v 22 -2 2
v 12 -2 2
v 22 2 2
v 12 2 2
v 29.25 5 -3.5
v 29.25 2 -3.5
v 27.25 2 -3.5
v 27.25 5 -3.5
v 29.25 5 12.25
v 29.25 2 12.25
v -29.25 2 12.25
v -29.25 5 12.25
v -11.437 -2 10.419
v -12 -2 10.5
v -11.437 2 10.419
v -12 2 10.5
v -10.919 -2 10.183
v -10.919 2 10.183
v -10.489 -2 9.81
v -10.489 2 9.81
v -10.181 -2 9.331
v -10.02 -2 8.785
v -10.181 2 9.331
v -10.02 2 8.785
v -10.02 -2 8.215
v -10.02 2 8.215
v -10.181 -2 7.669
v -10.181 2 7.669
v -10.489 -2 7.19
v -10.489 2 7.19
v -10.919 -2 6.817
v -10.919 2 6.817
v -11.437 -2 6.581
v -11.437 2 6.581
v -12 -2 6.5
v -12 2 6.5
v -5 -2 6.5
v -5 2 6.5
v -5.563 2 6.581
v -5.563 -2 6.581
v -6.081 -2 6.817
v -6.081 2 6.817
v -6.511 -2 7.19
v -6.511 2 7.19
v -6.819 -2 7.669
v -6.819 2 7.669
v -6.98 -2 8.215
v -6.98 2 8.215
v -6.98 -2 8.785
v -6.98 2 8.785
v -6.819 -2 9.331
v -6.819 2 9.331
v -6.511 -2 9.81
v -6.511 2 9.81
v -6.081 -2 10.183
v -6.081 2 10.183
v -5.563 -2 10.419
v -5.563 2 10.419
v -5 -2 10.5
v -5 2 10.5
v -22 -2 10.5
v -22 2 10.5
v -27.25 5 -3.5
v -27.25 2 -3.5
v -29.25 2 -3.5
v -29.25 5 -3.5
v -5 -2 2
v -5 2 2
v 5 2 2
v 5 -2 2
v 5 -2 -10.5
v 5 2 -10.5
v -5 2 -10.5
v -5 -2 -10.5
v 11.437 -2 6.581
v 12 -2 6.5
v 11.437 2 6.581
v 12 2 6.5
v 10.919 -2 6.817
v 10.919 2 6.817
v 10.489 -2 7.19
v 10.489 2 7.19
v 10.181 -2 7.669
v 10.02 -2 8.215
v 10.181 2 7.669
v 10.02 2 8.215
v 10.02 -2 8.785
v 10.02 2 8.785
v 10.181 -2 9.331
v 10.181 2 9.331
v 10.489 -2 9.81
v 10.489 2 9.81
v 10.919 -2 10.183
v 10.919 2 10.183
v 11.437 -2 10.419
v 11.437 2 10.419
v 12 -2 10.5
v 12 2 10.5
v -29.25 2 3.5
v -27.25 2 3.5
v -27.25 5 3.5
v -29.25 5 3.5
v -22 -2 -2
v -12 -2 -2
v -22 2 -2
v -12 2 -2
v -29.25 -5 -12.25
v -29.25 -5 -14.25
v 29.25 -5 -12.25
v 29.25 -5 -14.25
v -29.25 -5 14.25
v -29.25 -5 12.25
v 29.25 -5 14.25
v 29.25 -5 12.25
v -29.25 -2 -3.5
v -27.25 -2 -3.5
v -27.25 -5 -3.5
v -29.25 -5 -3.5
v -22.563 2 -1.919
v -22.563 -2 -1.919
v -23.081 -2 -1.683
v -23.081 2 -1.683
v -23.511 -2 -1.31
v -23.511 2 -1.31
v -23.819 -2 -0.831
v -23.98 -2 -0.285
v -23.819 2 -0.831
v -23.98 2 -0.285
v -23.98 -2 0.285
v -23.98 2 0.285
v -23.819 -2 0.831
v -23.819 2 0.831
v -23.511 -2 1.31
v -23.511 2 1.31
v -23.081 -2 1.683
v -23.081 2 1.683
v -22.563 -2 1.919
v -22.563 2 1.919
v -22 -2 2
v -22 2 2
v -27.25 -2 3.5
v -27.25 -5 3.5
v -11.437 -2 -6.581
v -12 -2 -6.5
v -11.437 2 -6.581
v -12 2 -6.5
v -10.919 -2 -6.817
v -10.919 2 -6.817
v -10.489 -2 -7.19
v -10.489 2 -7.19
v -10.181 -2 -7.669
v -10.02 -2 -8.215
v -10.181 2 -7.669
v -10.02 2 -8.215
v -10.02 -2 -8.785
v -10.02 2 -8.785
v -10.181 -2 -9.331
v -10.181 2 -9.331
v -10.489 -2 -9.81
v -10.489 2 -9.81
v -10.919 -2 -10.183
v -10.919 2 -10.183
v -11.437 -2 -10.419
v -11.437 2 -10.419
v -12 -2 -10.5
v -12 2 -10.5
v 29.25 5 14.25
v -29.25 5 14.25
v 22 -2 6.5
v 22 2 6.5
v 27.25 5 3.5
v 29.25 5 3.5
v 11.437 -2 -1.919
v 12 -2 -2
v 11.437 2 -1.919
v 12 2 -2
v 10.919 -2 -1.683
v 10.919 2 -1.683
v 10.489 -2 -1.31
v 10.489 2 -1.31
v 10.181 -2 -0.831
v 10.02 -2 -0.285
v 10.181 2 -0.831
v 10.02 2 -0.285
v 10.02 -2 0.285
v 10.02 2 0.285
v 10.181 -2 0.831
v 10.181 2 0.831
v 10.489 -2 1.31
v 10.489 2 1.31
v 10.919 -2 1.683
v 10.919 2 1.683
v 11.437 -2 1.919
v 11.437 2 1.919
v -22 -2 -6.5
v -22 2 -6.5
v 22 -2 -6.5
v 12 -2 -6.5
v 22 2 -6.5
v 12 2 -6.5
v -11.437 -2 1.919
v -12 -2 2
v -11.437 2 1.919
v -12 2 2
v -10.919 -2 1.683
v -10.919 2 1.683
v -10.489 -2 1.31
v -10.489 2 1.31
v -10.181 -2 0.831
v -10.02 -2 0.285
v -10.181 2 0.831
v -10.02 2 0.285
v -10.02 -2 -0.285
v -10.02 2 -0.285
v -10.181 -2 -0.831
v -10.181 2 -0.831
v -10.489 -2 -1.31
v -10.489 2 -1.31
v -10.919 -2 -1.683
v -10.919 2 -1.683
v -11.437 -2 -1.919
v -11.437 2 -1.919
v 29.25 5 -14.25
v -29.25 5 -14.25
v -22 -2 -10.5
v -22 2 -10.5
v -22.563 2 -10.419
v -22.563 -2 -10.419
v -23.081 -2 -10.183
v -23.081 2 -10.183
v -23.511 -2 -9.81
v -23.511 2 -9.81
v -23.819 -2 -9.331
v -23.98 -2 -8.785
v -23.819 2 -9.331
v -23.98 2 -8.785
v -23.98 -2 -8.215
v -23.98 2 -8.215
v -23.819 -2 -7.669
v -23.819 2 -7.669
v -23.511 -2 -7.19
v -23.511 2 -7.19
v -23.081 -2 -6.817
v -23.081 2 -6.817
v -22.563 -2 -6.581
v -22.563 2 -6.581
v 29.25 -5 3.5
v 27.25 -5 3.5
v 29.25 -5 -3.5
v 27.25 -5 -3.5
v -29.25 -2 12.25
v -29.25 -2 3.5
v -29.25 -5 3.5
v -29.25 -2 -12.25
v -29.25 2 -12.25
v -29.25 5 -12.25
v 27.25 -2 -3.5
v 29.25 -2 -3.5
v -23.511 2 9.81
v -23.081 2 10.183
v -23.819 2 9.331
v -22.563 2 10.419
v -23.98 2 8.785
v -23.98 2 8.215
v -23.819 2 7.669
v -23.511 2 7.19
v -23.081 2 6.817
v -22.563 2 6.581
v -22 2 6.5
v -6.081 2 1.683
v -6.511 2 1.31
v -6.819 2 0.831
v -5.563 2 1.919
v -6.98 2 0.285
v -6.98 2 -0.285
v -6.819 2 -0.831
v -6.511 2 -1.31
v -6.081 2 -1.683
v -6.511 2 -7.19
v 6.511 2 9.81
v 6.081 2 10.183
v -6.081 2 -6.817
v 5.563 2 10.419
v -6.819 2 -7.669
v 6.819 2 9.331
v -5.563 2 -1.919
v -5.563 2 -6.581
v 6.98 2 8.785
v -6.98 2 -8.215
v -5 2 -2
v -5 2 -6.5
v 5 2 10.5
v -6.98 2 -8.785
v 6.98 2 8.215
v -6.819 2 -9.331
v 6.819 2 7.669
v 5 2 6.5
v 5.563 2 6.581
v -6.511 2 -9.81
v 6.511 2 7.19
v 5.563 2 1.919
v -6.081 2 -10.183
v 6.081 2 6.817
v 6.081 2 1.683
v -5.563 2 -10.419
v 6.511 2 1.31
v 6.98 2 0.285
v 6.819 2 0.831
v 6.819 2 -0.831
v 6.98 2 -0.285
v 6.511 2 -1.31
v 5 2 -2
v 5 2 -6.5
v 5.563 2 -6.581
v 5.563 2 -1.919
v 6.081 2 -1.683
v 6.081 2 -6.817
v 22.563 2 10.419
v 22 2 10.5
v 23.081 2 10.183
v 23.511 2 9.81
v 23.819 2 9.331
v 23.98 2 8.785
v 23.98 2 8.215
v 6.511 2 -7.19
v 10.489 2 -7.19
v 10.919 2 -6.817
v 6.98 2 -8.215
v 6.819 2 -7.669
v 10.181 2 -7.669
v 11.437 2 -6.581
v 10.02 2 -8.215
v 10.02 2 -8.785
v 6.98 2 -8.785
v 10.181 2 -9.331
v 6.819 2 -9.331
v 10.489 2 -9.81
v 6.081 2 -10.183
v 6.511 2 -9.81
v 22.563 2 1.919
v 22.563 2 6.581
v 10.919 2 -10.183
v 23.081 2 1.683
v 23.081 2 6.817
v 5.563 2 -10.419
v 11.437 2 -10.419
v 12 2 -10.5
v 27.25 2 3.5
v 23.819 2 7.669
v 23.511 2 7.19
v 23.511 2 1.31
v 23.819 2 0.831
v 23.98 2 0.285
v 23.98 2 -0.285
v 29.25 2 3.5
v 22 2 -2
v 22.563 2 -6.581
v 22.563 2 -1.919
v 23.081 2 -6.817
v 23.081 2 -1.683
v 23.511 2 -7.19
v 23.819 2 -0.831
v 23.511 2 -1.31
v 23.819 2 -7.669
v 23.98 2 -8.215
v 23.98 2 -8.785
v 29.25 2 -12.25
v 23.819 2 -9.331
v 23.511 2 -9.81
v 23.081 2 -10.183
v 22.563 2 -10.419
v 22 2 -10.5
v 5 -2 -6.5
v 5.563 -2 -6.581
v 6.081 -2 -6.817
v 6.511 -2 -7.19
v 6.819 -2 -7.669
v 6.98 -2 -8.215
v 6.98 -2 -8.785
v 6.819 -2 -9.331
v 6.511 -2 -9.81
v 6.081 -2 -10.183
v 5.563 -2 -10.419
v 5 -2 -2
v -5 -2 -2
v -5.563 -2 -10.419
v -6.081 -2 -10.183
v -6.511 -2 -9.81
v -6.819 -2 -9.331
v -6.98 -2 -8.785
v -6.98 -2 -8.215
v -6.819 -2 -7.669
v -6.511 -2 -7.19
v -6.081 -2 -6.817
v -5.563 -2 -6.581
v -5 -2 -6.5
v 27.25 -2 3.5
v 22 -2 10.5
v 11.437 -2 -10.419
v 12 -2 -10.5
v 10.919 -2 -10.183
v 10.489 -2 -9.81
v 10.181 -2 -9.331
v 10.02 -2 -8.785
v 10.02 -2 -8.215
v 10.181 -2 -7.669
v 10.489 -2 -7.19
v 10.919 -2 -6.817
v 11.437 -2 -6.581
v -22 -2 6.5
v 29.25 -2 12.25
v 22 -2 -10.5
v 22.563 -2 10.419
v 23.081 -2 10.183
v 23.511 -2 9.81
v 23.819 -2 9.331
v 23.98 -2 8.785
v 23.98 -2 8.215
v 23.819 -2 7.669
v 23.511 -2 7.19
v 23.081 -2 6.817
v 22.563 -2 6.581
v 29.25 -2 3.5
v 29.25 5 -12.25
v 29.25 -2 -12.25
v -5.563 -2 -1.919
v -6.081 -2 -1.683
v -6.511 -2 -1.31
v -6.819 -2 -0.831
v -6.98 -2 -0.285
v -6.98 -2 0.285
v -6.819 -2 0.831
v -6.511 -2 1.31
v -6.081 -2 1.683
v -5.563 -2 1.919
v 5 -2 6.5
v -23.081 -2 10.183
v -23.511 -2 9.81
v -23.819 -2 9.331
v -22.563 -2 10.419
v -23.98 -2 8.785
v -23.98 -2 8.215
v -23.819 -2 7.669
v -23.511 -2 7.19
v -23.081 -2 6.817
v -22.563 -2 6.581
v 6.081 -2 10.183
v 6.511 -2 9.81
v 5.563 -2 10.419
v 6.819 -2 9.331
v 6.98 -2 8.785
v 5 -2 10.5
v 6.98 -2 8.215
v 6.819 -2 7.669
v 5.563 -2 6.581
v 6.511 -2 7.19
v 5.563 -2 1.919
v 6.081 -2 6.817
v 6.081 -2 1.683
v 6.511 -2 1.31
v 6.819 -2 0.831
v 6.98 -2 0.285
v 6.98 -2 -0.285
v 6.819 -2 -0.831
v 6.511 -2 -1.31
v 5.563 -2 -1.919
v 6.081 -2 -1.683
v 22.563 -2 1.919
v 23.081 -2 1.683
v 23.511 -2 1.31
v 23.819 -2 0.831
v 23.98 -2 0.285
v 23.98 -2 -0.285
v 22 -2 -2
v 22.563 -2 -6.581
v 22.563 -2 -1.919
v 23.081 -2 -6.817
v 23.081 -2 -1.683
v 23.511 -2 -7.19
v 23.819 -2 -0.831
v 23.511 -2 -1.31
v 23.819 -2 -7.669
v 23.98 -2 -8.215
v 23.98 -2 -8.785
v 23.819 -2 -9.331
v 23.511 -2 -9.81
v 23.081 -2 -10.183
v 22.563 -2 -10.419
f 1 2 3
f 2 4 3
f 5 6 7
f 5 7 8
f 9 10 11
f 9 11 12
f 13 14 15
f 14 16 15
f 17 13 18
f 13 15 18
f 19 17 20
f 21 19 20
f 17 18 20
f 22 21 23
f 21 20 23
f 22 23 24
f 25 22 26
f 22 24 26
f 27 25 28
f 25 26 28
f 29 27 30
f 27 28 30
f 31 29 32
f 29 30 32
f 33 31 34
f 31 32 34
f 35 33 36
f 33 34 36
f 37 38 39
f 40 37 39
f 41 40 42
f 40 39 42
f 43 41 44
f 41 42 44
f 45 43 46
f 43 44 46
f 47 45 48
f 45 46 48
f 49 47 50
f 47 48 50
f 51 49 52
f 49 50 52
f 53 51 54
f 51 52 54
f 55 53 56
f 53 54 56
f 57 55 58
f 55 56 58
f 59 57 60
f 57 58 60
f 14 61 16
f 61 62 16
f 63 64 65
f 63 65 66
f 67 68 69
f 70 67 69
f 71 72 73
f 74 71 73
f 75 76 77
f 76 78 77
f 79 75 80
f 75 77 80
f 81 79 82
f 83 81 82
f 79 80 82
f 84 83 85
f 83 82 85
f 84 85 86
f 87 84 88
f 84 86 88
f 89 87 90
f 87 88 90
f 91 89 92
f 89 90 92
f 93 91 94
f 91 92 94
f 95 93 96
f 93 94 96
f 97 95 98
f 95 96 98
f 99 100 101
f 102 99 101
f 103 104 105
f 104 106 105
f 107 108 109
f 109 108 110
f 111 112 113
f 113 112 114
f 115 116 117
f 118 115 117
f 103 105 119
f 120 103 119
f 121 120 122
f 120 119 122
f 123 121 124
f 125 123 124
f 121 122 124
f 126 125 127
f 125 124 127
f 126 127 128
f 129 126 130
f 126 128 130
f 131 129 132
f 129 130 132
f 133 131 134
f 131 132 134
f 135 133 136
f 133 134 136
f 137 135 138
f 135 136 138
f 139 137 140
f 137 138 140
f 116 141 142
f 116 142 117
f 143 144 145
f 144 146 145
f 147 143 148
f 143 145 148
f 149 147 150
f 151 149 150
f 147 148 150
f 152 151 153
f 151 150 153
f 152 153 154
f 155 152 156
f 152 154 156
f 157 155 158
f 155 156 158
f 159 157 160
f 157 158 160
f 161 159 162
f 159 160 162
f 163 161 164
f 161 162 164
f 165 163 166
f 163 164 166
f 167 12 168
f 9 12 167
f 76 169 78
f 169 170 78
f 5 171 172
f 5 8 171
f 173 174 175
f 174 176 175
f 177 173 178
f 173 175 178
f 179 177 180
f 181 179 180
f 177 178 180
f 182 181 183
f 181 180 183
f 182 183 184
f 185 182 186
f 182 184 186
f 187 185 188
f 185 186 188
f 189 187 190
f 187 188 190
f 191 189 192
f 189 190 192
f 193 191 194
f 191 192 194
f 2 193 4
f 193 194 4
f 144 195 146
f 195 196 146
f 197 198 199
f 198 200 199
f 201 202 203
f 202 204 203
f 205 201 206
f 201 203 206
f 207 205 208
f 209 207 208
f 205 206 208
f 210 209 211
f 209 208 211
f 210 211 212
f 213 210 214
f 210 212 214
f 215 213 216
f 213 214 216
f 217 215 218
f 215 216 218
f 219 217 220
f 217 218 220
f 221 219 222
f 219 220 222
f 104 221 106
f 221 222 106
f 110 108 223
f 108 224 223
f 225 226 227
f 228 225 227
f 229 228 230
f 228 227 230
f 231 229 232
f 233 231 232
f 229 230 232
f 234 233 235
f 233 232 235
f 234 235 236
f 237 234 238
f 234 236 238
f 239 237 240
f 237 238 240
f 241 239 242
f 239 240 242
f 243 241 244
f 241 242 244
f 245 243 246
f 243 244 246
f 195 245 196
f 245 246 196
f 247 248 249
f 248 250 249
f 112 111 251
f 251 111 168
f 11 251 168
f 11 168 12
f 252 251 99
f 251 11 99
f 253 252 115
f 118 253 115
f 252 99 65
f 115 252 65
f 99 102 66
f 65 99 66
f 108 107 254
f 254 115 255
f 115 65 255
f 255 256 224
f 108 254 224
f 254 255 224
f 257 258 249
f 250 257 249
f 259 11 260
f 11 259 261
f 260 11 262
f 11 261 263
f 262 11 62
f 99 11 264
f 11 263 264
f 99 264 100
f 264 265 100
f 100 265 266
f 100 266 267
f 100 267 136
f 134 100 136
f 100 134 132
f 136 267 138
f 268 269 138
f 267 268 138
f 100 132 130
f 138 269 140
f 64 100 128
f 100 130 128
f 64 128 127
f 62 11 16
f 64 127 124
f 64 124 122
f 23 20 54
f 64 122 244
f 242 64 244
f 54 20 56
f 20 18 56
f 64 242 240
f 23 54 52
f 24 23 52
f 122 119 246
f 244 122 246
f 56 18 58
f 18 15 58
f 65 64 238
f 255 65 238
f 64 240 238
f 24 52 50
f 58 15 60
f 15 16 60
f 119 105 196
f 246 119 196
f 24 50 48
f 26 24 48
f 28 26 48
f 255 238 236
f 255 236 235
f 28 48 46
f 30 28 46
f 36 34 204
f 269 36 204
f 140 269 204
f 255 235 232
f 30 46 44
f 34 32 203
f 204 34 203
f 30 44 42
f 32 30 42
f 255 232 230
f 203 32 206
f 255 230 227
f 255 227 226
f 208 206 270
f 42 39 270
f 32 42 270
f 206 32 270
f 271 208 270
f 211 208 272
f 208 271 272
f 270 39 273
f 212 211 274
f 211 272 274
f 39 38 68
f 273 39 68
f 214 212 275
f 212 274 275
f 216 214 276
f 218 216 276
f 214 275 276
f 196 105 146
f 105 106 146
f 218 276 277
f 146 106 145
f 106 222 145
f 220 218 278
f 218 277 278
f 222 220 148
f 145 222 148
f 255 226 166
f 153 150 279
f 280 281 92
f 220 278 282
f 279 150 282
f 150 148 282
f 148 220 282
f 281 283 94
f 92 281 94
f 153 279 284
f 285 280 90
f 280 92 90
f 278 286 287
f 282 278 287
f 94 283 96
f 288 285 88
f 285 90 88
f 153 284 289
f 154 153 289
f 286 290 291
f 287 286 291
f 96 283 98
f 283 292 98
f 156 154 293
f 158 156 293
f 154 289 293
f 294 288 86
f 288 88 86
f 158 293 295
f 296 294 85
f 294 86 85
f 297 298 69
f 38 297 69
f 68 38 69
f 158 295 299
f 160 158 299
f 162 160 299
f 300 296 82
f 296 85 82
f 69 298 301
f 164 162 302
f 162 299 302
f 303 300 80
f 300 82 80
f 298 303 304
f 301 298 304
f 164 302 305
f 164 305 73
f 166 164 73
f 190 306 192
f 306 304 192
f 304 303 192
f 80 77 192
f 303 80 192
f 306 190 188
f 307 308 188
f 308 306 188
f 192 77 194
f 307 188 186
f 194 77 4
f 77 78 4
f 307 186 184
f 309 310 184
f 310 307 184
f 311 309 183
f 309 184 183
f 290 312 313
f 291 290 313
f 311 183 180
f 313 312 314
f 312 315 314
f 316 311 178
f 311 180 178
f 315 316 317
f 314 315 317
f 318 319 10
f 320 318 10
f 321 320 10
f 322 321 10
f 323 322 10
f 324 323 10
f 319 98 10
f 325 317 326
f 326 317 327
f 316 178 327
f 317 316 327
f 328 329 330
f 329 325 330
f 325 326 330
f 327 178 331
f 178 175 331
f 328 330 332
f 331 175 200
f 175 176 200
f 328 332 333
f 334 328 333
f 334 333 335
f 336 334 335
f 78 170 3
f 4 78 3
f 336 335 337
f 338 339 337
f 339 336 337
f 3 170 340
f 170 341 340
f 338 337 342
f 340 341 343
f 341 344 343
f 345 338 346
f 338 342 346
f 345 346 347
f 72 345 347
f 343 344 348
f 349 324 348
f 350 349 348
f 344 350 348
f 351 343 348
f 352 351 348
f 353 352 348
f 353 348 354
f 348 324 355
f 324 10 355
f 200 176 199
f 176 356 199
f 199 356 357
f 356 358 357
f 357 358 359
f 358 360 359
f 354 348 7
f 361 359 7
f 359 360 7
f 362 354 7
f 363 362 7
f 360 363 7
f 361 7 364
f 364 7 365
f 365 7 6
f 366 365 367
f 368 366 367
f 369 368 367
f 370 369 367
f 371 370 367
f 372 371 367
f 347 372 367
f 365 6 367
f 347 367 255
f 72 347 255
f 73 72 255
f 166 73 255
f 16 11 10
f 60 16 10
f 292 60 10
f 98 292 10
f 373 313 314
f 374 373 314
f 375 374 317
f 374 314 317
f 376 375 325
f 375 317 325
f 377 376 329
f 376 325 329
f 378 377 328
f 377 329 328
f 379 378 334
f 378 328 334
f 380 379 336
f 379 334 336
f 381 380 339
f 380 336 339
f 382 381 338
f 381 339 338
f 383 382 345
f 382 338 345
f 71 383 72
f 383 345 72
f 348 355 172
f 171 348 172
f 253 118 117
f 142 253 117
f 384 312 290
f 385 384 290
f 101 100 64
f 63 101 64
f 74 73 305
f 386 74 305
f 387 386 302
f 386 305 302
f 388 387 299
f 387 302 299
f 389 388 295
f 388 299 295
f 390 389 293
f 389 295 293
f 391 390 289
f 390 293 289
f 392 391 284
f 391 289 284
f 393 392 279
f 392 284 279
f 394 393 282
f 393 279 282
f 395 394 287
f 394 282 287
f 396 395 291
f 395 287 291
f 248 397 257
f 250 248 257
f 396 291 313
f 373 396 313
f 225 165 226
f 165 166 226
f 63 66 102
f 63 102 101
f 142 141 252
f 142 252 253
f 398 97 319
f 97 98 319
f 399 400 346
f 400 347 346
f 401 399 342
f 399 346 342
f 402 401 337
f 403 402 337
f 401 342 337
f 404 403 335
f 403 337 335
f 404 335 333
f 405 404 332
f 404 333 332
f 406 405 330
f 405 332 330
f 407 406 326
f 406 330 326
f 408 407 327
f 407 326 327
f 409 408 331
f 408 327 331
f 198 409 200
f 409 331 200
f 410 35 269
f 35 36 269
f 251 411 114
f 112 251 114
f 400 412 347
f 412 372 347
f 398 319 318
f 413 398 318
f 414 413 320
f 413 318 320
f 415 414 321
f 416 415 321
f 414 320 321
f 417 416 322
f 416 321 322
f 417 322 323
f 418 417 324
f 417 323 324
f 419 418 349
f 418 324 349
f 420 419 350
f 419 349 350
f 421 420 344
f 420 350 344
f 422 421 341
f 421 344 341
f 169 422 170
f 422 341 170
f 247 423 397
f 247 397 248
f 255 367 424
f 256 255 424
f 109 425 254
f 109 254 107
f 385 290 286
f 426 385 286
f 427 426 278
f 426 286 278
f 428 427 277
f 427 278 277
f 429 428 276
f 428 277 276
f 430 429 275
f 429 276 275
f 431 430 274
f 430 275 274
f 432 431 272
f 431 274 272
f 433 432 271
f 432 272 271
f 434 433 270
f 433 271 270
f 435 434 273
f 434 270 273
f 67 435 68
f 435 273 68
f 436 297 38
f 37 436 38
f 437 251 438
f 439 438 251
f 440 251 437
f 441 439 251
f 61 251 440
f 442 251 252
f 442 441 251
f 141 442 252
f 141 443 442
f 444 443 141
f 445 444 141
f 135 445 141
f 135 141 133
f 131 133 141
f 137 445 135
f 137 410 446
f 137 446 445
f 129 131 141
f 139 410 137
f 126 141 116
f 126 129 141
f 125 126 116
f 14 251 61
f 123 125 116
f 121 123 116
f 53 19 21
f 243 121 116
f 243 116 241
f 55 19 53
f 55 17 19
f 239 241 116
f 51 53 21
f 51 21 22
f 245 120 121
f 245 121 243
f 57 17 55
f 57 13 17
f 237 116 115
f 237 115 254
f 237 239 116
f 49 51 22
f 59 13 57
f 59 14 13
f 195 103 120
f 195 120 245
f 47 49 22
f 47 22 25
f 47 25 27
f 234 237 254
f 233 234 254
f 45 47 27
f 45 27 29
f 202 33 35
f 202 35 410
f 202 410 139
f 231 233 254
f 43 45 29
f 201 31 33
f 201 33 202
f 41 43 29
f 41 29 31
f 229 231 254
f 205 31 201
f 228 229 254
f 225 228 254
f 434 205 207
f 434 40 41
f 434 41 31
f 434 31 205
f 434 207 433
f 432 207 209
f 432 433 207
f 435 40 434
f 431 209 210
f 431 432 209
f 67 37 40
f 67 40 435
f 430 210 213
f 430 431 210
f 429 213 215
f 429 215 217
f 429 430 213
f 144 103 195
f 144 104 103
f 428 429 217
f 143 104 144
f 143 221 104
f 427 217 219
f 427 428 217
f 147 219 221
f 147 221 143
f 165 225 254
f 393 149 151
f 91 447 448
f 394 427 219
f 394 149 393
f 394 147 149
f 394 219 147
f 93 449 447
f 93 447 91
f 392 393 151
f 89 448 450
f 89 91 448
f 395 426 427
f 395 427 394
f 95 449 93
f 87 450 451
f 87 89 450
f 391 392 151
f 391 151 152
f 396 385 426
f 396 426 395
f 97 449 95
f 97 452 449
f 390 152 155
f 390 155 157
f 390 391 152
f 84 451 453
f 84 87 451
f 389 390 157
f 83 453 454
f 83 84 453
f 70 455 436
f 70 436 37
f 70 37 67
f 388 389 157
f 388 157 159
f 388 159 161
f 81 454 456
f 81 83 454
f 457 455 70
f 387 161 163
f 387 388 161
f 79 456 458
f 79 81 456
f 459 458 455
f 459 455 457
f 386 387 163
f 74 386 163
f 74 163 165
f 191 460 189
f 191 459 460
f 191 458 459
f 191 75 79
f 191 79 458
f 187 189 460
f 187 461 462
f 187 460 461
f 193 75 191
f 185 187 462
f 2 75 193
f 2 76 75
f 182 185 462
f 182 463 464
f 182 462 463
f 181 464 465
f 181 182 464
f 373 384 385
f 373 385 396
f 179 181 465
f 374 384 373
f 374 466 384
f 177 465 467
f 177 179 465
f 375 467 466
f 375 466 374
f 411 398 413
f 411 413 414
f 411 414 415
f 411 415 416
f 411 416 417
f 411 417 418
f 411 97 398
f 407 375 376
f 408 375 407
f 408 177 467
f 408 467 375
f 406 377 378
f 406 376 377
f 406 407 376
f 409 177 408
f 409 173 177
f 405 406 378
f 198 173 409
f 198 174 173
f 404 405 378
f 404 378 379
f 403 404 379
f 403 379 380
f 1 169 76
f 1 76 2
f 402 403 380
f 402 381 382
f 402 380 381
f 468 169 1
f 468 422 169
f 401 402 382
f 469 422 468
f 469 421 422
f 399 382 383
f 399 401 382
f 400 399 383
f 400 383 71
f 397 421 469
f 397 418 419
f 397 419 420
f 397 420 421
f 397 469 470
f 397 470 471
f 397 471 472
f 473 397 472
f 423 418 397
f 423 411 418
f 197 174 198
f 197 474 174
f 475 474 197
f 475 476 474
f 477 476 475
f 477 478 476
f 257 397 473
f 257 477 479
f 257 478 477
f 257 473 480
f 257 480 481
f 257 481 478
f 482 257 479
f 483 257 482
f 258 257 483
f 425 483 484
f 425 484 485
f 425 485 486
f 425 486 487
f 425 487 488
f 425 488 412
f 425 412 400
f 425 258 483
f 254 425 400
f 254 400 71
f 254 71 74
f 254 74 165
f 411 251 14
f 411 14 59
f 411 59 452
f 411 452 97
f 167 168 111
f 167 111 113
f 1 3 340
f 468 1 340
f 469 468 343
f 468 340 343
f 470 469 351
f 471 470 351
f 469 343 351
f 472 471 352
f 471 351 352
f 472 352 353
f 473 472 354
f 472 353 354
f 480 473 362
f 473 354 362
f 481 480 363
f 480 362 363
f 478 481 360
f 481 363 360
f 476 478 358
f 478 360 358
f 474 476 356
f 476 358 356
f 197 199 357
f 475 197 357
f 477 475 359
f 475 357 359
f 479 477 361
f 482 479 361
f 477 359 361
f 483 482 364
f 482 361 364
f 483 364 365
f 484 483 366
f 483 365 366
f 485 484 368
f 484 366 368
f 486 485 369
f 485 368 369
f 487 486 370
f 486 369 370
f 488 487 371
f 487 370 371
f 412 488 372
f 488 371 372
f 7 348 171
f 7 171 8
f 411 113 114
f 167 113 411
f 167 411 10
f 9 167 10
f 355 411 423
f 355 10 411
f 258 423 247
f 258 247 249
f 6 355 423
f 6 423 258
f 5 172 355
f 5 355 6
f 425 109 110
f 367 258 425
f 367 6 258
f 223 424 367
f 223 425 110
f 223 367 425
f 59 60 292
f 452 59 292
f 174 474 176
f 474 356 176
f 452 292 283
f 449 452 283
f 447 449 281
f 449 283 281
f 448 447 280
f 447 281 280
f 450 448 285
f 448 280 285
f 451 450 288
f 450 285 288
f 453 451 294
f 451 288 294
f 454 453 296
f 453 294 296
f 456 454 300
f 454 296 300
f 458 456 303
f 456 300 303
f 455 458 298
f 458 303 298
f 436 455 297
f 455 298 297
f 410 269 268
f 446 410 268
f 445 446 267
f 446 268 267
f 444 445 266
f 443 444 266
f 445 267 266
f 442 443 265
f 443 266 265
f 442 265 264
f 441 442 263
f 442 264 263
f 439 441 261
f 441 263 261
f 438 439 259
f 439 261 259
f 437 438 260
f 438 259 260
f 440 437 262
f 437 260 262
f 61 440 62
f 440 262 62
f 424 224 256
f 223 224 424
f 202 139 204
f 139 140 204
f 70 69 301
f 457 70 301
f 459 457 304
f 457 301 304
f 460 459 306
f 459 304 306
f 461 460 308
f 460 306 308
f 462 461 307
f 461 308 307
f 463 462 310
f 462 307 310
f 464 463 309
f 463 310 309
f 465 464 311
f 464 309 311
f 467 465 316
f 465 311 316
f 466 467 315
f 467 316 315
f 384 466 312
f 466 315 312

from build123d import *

# Parameters (mm, degrees)
SKETCH1_W           = 54.5
SKETCH1_H           = 24.5
BOSS_EXTRUDE1_DEPTH = 2
BOSS_EXTRUDE2_START = -2
SKETCH2_W           = 58.5
SKETCH2_H           = 28.5
SKETCH2_W_2         = 54.5
SKETCH2_H_2         = 24.5
BOSS_EXTRUDE2_DEPTH = 5
CUT_EXTRUDE1_DEPTH  = 33.918459867
FILL_PATTERN1_DEPTH = 2
LPATTERN1_COUNT     = 2
LPATTERN1_PITCH     = 8.5
LPATTERN1_COL_COUNT = 2
LPATTERN1_COL_PITCH = 8.5
SKETCH13_W          = 8.75
SKETCH13_H          = 3
CUT_EXTRUDE2_DEPTH  = 61.417816081


# Read off the part's stored shape, not the designer's step: Fill Pattern1
with BuildPart() as part:
    # Sketch1 → Boss-Extrude1 (new body)
    with BuildSketch(Plane(origin=(0, 0, 0), x_dir=(1, 0, 0), z_dir=(0, 1, 0))):
        Rectangle(SKETCH1_W, SKETCH1_H)
    extrude(amount=BOSS_EXTRUDE1_DEPTH)

    # Sketch2 → Boss-Extrude2 (add)
    with BuildSketch(Plane(origin=(0, 2, 0), x_dir=(1, 0, 0), z_dir=(0, 1, 0)).offset(BOSS_EXTRUDE2_START)):
        Rectangle(SKETCH2_W, SKETCH2_H)
        Rectangle(SKETCH2_W_2, SKETCH2_H_2, mode=Mode.SUBTRACT)
    extrude(amount=BOSS_EXTRUDE2_DEPTH)

    # Sketch5 → Cut-Extrude1 (cut, through all)
    with BuildSketch(Plane.XZ):
        with BuildLine():
            Line((-5, 2), (5, 2))
            ThreePointArc((5, 2), (7, 0), (5, -2))
            Line((5, -2), (-5, -2))
            ThreePointArc((-5, -2), (-7, 0), (-5, 2))
        make_face()
    cut_extrude1 = extrude(amount=-CUT_EXTRUDE1_DEPTH, mode=Mode.SUBTRACT)

    # Fill Pattern1 outline → Fill Pattern1 (cut)
    with BuildSketch(Plane(origin=(0, 0, 0), x_dir=(1, 0, 0), z_dir=(0, 1, 0))):
        with BuildLine():
            ThreePointArc((-22, 2), (-24, 0), (-22, -2))
            Line((-22, -2), (-12, -2))
            ThreePointArc((-12, -2), (-10, 0), (-12, 2))
            Line((-12, 2), (-22, 2))
        make_face()
        with BuildLine():
            ThreePointArc((12, 2), (10, 0), (12, -2))
            Line((12, -2), (22, -2))
            ThreePointArc((22, -2), (24, 0), (22, 2))
            Line((22, 2), (12, 2))
        make_face()
        with BuildLine():
            ThreePointArc((-22, 10.5), (-24, 8.5), (-22, 6.5))
            Line((-22, 6.5), (-12, 6.5))
            ThreePointArc((-12, 6.5), (-10, 8.5), (-12, 10.5))
            Line((-12, 10.5), (-22, 10.5))
        make_face()
        with BuildLine():
            ThreePointArc((12, 10.5), (10, 8.5), (12, 6.5))
            Line((12, 6.5), (22, 6.5))
            ThreePointArc((22, 6.5), (24, 8.5), (22, 10.5))
            Line((22, 10.5), (12, 10.5))
        make_face()
        with BuildLine():
            ThreePointArc((-22, -6.5), (-24, -8.5), (-22, -10.5))
            Line((-22, -10.5), (-12, -10.5))
            ThreePointArc((-12, -10.5), (-10, -8.5), (-12, -6.5))
            Line((-12, -6.5), (-22, -6.5))
        make_face()
        with BuildLine():
            ThreePointArc((12, -6.5), (10, -8.5), (12, -10.5))
            Line((12, -10.5), (22, -10.5))
            ThreePointArc((22, -10.5), (24, -8.5), (22, -6.5))
            Line((22, -6.5), (12, -6.5))
        make_face()
    extrude(amount=FILL_PATTERN1_DEPTH, mode=Mode.SUBTRACT)

    # LPattern1: Cut-Extrude1 ×2
    with Locations(*[(0, 0, i * LPATTERN1_PITCH) for i in range(1, LPATTERN1_COUNT)]):
        add(cut_extrude1, mode=Mode.SUBTRACT)

    # LPattern1 col: Cut-Extrude1 ×2
    with Locations(*[(0, 0, -i * LPATTERN1_COL_PITCH) for i in range(1, LPATTERN1_COL_COUNT)]):
        add(cut_extrude1, mode=Mode.SUBTRACT)

    # Sketch13 → Cut-Extrude2 (cut, through all)
    with BuildSketch(Plane(origin=(29.25, 0, 0), x_dir=(0, 0, -1), z_dir=(1, 0, 0))):
        with Locations((-7.875, 3.5)):
            Rectangle(SKETCH13_W, SKETCH13_H)
        with Locations((7.875, 3.5)):
            Rectangle(SKETCH13_W, SKETCH13_H)
    extrude(amount=-CUT_EXTRUDE2_DEPTH, mode=Mode.SUBTRACT)

    # Mirror1: part across plane


with BuildPart() as part_1:
    add(part.part)
    add(part.part.mirror(Plane(origin=(0, 0, 0), x_dir=(0, 0, 1), z_dir=(0, -1, 0))))


solid = part_1.part
